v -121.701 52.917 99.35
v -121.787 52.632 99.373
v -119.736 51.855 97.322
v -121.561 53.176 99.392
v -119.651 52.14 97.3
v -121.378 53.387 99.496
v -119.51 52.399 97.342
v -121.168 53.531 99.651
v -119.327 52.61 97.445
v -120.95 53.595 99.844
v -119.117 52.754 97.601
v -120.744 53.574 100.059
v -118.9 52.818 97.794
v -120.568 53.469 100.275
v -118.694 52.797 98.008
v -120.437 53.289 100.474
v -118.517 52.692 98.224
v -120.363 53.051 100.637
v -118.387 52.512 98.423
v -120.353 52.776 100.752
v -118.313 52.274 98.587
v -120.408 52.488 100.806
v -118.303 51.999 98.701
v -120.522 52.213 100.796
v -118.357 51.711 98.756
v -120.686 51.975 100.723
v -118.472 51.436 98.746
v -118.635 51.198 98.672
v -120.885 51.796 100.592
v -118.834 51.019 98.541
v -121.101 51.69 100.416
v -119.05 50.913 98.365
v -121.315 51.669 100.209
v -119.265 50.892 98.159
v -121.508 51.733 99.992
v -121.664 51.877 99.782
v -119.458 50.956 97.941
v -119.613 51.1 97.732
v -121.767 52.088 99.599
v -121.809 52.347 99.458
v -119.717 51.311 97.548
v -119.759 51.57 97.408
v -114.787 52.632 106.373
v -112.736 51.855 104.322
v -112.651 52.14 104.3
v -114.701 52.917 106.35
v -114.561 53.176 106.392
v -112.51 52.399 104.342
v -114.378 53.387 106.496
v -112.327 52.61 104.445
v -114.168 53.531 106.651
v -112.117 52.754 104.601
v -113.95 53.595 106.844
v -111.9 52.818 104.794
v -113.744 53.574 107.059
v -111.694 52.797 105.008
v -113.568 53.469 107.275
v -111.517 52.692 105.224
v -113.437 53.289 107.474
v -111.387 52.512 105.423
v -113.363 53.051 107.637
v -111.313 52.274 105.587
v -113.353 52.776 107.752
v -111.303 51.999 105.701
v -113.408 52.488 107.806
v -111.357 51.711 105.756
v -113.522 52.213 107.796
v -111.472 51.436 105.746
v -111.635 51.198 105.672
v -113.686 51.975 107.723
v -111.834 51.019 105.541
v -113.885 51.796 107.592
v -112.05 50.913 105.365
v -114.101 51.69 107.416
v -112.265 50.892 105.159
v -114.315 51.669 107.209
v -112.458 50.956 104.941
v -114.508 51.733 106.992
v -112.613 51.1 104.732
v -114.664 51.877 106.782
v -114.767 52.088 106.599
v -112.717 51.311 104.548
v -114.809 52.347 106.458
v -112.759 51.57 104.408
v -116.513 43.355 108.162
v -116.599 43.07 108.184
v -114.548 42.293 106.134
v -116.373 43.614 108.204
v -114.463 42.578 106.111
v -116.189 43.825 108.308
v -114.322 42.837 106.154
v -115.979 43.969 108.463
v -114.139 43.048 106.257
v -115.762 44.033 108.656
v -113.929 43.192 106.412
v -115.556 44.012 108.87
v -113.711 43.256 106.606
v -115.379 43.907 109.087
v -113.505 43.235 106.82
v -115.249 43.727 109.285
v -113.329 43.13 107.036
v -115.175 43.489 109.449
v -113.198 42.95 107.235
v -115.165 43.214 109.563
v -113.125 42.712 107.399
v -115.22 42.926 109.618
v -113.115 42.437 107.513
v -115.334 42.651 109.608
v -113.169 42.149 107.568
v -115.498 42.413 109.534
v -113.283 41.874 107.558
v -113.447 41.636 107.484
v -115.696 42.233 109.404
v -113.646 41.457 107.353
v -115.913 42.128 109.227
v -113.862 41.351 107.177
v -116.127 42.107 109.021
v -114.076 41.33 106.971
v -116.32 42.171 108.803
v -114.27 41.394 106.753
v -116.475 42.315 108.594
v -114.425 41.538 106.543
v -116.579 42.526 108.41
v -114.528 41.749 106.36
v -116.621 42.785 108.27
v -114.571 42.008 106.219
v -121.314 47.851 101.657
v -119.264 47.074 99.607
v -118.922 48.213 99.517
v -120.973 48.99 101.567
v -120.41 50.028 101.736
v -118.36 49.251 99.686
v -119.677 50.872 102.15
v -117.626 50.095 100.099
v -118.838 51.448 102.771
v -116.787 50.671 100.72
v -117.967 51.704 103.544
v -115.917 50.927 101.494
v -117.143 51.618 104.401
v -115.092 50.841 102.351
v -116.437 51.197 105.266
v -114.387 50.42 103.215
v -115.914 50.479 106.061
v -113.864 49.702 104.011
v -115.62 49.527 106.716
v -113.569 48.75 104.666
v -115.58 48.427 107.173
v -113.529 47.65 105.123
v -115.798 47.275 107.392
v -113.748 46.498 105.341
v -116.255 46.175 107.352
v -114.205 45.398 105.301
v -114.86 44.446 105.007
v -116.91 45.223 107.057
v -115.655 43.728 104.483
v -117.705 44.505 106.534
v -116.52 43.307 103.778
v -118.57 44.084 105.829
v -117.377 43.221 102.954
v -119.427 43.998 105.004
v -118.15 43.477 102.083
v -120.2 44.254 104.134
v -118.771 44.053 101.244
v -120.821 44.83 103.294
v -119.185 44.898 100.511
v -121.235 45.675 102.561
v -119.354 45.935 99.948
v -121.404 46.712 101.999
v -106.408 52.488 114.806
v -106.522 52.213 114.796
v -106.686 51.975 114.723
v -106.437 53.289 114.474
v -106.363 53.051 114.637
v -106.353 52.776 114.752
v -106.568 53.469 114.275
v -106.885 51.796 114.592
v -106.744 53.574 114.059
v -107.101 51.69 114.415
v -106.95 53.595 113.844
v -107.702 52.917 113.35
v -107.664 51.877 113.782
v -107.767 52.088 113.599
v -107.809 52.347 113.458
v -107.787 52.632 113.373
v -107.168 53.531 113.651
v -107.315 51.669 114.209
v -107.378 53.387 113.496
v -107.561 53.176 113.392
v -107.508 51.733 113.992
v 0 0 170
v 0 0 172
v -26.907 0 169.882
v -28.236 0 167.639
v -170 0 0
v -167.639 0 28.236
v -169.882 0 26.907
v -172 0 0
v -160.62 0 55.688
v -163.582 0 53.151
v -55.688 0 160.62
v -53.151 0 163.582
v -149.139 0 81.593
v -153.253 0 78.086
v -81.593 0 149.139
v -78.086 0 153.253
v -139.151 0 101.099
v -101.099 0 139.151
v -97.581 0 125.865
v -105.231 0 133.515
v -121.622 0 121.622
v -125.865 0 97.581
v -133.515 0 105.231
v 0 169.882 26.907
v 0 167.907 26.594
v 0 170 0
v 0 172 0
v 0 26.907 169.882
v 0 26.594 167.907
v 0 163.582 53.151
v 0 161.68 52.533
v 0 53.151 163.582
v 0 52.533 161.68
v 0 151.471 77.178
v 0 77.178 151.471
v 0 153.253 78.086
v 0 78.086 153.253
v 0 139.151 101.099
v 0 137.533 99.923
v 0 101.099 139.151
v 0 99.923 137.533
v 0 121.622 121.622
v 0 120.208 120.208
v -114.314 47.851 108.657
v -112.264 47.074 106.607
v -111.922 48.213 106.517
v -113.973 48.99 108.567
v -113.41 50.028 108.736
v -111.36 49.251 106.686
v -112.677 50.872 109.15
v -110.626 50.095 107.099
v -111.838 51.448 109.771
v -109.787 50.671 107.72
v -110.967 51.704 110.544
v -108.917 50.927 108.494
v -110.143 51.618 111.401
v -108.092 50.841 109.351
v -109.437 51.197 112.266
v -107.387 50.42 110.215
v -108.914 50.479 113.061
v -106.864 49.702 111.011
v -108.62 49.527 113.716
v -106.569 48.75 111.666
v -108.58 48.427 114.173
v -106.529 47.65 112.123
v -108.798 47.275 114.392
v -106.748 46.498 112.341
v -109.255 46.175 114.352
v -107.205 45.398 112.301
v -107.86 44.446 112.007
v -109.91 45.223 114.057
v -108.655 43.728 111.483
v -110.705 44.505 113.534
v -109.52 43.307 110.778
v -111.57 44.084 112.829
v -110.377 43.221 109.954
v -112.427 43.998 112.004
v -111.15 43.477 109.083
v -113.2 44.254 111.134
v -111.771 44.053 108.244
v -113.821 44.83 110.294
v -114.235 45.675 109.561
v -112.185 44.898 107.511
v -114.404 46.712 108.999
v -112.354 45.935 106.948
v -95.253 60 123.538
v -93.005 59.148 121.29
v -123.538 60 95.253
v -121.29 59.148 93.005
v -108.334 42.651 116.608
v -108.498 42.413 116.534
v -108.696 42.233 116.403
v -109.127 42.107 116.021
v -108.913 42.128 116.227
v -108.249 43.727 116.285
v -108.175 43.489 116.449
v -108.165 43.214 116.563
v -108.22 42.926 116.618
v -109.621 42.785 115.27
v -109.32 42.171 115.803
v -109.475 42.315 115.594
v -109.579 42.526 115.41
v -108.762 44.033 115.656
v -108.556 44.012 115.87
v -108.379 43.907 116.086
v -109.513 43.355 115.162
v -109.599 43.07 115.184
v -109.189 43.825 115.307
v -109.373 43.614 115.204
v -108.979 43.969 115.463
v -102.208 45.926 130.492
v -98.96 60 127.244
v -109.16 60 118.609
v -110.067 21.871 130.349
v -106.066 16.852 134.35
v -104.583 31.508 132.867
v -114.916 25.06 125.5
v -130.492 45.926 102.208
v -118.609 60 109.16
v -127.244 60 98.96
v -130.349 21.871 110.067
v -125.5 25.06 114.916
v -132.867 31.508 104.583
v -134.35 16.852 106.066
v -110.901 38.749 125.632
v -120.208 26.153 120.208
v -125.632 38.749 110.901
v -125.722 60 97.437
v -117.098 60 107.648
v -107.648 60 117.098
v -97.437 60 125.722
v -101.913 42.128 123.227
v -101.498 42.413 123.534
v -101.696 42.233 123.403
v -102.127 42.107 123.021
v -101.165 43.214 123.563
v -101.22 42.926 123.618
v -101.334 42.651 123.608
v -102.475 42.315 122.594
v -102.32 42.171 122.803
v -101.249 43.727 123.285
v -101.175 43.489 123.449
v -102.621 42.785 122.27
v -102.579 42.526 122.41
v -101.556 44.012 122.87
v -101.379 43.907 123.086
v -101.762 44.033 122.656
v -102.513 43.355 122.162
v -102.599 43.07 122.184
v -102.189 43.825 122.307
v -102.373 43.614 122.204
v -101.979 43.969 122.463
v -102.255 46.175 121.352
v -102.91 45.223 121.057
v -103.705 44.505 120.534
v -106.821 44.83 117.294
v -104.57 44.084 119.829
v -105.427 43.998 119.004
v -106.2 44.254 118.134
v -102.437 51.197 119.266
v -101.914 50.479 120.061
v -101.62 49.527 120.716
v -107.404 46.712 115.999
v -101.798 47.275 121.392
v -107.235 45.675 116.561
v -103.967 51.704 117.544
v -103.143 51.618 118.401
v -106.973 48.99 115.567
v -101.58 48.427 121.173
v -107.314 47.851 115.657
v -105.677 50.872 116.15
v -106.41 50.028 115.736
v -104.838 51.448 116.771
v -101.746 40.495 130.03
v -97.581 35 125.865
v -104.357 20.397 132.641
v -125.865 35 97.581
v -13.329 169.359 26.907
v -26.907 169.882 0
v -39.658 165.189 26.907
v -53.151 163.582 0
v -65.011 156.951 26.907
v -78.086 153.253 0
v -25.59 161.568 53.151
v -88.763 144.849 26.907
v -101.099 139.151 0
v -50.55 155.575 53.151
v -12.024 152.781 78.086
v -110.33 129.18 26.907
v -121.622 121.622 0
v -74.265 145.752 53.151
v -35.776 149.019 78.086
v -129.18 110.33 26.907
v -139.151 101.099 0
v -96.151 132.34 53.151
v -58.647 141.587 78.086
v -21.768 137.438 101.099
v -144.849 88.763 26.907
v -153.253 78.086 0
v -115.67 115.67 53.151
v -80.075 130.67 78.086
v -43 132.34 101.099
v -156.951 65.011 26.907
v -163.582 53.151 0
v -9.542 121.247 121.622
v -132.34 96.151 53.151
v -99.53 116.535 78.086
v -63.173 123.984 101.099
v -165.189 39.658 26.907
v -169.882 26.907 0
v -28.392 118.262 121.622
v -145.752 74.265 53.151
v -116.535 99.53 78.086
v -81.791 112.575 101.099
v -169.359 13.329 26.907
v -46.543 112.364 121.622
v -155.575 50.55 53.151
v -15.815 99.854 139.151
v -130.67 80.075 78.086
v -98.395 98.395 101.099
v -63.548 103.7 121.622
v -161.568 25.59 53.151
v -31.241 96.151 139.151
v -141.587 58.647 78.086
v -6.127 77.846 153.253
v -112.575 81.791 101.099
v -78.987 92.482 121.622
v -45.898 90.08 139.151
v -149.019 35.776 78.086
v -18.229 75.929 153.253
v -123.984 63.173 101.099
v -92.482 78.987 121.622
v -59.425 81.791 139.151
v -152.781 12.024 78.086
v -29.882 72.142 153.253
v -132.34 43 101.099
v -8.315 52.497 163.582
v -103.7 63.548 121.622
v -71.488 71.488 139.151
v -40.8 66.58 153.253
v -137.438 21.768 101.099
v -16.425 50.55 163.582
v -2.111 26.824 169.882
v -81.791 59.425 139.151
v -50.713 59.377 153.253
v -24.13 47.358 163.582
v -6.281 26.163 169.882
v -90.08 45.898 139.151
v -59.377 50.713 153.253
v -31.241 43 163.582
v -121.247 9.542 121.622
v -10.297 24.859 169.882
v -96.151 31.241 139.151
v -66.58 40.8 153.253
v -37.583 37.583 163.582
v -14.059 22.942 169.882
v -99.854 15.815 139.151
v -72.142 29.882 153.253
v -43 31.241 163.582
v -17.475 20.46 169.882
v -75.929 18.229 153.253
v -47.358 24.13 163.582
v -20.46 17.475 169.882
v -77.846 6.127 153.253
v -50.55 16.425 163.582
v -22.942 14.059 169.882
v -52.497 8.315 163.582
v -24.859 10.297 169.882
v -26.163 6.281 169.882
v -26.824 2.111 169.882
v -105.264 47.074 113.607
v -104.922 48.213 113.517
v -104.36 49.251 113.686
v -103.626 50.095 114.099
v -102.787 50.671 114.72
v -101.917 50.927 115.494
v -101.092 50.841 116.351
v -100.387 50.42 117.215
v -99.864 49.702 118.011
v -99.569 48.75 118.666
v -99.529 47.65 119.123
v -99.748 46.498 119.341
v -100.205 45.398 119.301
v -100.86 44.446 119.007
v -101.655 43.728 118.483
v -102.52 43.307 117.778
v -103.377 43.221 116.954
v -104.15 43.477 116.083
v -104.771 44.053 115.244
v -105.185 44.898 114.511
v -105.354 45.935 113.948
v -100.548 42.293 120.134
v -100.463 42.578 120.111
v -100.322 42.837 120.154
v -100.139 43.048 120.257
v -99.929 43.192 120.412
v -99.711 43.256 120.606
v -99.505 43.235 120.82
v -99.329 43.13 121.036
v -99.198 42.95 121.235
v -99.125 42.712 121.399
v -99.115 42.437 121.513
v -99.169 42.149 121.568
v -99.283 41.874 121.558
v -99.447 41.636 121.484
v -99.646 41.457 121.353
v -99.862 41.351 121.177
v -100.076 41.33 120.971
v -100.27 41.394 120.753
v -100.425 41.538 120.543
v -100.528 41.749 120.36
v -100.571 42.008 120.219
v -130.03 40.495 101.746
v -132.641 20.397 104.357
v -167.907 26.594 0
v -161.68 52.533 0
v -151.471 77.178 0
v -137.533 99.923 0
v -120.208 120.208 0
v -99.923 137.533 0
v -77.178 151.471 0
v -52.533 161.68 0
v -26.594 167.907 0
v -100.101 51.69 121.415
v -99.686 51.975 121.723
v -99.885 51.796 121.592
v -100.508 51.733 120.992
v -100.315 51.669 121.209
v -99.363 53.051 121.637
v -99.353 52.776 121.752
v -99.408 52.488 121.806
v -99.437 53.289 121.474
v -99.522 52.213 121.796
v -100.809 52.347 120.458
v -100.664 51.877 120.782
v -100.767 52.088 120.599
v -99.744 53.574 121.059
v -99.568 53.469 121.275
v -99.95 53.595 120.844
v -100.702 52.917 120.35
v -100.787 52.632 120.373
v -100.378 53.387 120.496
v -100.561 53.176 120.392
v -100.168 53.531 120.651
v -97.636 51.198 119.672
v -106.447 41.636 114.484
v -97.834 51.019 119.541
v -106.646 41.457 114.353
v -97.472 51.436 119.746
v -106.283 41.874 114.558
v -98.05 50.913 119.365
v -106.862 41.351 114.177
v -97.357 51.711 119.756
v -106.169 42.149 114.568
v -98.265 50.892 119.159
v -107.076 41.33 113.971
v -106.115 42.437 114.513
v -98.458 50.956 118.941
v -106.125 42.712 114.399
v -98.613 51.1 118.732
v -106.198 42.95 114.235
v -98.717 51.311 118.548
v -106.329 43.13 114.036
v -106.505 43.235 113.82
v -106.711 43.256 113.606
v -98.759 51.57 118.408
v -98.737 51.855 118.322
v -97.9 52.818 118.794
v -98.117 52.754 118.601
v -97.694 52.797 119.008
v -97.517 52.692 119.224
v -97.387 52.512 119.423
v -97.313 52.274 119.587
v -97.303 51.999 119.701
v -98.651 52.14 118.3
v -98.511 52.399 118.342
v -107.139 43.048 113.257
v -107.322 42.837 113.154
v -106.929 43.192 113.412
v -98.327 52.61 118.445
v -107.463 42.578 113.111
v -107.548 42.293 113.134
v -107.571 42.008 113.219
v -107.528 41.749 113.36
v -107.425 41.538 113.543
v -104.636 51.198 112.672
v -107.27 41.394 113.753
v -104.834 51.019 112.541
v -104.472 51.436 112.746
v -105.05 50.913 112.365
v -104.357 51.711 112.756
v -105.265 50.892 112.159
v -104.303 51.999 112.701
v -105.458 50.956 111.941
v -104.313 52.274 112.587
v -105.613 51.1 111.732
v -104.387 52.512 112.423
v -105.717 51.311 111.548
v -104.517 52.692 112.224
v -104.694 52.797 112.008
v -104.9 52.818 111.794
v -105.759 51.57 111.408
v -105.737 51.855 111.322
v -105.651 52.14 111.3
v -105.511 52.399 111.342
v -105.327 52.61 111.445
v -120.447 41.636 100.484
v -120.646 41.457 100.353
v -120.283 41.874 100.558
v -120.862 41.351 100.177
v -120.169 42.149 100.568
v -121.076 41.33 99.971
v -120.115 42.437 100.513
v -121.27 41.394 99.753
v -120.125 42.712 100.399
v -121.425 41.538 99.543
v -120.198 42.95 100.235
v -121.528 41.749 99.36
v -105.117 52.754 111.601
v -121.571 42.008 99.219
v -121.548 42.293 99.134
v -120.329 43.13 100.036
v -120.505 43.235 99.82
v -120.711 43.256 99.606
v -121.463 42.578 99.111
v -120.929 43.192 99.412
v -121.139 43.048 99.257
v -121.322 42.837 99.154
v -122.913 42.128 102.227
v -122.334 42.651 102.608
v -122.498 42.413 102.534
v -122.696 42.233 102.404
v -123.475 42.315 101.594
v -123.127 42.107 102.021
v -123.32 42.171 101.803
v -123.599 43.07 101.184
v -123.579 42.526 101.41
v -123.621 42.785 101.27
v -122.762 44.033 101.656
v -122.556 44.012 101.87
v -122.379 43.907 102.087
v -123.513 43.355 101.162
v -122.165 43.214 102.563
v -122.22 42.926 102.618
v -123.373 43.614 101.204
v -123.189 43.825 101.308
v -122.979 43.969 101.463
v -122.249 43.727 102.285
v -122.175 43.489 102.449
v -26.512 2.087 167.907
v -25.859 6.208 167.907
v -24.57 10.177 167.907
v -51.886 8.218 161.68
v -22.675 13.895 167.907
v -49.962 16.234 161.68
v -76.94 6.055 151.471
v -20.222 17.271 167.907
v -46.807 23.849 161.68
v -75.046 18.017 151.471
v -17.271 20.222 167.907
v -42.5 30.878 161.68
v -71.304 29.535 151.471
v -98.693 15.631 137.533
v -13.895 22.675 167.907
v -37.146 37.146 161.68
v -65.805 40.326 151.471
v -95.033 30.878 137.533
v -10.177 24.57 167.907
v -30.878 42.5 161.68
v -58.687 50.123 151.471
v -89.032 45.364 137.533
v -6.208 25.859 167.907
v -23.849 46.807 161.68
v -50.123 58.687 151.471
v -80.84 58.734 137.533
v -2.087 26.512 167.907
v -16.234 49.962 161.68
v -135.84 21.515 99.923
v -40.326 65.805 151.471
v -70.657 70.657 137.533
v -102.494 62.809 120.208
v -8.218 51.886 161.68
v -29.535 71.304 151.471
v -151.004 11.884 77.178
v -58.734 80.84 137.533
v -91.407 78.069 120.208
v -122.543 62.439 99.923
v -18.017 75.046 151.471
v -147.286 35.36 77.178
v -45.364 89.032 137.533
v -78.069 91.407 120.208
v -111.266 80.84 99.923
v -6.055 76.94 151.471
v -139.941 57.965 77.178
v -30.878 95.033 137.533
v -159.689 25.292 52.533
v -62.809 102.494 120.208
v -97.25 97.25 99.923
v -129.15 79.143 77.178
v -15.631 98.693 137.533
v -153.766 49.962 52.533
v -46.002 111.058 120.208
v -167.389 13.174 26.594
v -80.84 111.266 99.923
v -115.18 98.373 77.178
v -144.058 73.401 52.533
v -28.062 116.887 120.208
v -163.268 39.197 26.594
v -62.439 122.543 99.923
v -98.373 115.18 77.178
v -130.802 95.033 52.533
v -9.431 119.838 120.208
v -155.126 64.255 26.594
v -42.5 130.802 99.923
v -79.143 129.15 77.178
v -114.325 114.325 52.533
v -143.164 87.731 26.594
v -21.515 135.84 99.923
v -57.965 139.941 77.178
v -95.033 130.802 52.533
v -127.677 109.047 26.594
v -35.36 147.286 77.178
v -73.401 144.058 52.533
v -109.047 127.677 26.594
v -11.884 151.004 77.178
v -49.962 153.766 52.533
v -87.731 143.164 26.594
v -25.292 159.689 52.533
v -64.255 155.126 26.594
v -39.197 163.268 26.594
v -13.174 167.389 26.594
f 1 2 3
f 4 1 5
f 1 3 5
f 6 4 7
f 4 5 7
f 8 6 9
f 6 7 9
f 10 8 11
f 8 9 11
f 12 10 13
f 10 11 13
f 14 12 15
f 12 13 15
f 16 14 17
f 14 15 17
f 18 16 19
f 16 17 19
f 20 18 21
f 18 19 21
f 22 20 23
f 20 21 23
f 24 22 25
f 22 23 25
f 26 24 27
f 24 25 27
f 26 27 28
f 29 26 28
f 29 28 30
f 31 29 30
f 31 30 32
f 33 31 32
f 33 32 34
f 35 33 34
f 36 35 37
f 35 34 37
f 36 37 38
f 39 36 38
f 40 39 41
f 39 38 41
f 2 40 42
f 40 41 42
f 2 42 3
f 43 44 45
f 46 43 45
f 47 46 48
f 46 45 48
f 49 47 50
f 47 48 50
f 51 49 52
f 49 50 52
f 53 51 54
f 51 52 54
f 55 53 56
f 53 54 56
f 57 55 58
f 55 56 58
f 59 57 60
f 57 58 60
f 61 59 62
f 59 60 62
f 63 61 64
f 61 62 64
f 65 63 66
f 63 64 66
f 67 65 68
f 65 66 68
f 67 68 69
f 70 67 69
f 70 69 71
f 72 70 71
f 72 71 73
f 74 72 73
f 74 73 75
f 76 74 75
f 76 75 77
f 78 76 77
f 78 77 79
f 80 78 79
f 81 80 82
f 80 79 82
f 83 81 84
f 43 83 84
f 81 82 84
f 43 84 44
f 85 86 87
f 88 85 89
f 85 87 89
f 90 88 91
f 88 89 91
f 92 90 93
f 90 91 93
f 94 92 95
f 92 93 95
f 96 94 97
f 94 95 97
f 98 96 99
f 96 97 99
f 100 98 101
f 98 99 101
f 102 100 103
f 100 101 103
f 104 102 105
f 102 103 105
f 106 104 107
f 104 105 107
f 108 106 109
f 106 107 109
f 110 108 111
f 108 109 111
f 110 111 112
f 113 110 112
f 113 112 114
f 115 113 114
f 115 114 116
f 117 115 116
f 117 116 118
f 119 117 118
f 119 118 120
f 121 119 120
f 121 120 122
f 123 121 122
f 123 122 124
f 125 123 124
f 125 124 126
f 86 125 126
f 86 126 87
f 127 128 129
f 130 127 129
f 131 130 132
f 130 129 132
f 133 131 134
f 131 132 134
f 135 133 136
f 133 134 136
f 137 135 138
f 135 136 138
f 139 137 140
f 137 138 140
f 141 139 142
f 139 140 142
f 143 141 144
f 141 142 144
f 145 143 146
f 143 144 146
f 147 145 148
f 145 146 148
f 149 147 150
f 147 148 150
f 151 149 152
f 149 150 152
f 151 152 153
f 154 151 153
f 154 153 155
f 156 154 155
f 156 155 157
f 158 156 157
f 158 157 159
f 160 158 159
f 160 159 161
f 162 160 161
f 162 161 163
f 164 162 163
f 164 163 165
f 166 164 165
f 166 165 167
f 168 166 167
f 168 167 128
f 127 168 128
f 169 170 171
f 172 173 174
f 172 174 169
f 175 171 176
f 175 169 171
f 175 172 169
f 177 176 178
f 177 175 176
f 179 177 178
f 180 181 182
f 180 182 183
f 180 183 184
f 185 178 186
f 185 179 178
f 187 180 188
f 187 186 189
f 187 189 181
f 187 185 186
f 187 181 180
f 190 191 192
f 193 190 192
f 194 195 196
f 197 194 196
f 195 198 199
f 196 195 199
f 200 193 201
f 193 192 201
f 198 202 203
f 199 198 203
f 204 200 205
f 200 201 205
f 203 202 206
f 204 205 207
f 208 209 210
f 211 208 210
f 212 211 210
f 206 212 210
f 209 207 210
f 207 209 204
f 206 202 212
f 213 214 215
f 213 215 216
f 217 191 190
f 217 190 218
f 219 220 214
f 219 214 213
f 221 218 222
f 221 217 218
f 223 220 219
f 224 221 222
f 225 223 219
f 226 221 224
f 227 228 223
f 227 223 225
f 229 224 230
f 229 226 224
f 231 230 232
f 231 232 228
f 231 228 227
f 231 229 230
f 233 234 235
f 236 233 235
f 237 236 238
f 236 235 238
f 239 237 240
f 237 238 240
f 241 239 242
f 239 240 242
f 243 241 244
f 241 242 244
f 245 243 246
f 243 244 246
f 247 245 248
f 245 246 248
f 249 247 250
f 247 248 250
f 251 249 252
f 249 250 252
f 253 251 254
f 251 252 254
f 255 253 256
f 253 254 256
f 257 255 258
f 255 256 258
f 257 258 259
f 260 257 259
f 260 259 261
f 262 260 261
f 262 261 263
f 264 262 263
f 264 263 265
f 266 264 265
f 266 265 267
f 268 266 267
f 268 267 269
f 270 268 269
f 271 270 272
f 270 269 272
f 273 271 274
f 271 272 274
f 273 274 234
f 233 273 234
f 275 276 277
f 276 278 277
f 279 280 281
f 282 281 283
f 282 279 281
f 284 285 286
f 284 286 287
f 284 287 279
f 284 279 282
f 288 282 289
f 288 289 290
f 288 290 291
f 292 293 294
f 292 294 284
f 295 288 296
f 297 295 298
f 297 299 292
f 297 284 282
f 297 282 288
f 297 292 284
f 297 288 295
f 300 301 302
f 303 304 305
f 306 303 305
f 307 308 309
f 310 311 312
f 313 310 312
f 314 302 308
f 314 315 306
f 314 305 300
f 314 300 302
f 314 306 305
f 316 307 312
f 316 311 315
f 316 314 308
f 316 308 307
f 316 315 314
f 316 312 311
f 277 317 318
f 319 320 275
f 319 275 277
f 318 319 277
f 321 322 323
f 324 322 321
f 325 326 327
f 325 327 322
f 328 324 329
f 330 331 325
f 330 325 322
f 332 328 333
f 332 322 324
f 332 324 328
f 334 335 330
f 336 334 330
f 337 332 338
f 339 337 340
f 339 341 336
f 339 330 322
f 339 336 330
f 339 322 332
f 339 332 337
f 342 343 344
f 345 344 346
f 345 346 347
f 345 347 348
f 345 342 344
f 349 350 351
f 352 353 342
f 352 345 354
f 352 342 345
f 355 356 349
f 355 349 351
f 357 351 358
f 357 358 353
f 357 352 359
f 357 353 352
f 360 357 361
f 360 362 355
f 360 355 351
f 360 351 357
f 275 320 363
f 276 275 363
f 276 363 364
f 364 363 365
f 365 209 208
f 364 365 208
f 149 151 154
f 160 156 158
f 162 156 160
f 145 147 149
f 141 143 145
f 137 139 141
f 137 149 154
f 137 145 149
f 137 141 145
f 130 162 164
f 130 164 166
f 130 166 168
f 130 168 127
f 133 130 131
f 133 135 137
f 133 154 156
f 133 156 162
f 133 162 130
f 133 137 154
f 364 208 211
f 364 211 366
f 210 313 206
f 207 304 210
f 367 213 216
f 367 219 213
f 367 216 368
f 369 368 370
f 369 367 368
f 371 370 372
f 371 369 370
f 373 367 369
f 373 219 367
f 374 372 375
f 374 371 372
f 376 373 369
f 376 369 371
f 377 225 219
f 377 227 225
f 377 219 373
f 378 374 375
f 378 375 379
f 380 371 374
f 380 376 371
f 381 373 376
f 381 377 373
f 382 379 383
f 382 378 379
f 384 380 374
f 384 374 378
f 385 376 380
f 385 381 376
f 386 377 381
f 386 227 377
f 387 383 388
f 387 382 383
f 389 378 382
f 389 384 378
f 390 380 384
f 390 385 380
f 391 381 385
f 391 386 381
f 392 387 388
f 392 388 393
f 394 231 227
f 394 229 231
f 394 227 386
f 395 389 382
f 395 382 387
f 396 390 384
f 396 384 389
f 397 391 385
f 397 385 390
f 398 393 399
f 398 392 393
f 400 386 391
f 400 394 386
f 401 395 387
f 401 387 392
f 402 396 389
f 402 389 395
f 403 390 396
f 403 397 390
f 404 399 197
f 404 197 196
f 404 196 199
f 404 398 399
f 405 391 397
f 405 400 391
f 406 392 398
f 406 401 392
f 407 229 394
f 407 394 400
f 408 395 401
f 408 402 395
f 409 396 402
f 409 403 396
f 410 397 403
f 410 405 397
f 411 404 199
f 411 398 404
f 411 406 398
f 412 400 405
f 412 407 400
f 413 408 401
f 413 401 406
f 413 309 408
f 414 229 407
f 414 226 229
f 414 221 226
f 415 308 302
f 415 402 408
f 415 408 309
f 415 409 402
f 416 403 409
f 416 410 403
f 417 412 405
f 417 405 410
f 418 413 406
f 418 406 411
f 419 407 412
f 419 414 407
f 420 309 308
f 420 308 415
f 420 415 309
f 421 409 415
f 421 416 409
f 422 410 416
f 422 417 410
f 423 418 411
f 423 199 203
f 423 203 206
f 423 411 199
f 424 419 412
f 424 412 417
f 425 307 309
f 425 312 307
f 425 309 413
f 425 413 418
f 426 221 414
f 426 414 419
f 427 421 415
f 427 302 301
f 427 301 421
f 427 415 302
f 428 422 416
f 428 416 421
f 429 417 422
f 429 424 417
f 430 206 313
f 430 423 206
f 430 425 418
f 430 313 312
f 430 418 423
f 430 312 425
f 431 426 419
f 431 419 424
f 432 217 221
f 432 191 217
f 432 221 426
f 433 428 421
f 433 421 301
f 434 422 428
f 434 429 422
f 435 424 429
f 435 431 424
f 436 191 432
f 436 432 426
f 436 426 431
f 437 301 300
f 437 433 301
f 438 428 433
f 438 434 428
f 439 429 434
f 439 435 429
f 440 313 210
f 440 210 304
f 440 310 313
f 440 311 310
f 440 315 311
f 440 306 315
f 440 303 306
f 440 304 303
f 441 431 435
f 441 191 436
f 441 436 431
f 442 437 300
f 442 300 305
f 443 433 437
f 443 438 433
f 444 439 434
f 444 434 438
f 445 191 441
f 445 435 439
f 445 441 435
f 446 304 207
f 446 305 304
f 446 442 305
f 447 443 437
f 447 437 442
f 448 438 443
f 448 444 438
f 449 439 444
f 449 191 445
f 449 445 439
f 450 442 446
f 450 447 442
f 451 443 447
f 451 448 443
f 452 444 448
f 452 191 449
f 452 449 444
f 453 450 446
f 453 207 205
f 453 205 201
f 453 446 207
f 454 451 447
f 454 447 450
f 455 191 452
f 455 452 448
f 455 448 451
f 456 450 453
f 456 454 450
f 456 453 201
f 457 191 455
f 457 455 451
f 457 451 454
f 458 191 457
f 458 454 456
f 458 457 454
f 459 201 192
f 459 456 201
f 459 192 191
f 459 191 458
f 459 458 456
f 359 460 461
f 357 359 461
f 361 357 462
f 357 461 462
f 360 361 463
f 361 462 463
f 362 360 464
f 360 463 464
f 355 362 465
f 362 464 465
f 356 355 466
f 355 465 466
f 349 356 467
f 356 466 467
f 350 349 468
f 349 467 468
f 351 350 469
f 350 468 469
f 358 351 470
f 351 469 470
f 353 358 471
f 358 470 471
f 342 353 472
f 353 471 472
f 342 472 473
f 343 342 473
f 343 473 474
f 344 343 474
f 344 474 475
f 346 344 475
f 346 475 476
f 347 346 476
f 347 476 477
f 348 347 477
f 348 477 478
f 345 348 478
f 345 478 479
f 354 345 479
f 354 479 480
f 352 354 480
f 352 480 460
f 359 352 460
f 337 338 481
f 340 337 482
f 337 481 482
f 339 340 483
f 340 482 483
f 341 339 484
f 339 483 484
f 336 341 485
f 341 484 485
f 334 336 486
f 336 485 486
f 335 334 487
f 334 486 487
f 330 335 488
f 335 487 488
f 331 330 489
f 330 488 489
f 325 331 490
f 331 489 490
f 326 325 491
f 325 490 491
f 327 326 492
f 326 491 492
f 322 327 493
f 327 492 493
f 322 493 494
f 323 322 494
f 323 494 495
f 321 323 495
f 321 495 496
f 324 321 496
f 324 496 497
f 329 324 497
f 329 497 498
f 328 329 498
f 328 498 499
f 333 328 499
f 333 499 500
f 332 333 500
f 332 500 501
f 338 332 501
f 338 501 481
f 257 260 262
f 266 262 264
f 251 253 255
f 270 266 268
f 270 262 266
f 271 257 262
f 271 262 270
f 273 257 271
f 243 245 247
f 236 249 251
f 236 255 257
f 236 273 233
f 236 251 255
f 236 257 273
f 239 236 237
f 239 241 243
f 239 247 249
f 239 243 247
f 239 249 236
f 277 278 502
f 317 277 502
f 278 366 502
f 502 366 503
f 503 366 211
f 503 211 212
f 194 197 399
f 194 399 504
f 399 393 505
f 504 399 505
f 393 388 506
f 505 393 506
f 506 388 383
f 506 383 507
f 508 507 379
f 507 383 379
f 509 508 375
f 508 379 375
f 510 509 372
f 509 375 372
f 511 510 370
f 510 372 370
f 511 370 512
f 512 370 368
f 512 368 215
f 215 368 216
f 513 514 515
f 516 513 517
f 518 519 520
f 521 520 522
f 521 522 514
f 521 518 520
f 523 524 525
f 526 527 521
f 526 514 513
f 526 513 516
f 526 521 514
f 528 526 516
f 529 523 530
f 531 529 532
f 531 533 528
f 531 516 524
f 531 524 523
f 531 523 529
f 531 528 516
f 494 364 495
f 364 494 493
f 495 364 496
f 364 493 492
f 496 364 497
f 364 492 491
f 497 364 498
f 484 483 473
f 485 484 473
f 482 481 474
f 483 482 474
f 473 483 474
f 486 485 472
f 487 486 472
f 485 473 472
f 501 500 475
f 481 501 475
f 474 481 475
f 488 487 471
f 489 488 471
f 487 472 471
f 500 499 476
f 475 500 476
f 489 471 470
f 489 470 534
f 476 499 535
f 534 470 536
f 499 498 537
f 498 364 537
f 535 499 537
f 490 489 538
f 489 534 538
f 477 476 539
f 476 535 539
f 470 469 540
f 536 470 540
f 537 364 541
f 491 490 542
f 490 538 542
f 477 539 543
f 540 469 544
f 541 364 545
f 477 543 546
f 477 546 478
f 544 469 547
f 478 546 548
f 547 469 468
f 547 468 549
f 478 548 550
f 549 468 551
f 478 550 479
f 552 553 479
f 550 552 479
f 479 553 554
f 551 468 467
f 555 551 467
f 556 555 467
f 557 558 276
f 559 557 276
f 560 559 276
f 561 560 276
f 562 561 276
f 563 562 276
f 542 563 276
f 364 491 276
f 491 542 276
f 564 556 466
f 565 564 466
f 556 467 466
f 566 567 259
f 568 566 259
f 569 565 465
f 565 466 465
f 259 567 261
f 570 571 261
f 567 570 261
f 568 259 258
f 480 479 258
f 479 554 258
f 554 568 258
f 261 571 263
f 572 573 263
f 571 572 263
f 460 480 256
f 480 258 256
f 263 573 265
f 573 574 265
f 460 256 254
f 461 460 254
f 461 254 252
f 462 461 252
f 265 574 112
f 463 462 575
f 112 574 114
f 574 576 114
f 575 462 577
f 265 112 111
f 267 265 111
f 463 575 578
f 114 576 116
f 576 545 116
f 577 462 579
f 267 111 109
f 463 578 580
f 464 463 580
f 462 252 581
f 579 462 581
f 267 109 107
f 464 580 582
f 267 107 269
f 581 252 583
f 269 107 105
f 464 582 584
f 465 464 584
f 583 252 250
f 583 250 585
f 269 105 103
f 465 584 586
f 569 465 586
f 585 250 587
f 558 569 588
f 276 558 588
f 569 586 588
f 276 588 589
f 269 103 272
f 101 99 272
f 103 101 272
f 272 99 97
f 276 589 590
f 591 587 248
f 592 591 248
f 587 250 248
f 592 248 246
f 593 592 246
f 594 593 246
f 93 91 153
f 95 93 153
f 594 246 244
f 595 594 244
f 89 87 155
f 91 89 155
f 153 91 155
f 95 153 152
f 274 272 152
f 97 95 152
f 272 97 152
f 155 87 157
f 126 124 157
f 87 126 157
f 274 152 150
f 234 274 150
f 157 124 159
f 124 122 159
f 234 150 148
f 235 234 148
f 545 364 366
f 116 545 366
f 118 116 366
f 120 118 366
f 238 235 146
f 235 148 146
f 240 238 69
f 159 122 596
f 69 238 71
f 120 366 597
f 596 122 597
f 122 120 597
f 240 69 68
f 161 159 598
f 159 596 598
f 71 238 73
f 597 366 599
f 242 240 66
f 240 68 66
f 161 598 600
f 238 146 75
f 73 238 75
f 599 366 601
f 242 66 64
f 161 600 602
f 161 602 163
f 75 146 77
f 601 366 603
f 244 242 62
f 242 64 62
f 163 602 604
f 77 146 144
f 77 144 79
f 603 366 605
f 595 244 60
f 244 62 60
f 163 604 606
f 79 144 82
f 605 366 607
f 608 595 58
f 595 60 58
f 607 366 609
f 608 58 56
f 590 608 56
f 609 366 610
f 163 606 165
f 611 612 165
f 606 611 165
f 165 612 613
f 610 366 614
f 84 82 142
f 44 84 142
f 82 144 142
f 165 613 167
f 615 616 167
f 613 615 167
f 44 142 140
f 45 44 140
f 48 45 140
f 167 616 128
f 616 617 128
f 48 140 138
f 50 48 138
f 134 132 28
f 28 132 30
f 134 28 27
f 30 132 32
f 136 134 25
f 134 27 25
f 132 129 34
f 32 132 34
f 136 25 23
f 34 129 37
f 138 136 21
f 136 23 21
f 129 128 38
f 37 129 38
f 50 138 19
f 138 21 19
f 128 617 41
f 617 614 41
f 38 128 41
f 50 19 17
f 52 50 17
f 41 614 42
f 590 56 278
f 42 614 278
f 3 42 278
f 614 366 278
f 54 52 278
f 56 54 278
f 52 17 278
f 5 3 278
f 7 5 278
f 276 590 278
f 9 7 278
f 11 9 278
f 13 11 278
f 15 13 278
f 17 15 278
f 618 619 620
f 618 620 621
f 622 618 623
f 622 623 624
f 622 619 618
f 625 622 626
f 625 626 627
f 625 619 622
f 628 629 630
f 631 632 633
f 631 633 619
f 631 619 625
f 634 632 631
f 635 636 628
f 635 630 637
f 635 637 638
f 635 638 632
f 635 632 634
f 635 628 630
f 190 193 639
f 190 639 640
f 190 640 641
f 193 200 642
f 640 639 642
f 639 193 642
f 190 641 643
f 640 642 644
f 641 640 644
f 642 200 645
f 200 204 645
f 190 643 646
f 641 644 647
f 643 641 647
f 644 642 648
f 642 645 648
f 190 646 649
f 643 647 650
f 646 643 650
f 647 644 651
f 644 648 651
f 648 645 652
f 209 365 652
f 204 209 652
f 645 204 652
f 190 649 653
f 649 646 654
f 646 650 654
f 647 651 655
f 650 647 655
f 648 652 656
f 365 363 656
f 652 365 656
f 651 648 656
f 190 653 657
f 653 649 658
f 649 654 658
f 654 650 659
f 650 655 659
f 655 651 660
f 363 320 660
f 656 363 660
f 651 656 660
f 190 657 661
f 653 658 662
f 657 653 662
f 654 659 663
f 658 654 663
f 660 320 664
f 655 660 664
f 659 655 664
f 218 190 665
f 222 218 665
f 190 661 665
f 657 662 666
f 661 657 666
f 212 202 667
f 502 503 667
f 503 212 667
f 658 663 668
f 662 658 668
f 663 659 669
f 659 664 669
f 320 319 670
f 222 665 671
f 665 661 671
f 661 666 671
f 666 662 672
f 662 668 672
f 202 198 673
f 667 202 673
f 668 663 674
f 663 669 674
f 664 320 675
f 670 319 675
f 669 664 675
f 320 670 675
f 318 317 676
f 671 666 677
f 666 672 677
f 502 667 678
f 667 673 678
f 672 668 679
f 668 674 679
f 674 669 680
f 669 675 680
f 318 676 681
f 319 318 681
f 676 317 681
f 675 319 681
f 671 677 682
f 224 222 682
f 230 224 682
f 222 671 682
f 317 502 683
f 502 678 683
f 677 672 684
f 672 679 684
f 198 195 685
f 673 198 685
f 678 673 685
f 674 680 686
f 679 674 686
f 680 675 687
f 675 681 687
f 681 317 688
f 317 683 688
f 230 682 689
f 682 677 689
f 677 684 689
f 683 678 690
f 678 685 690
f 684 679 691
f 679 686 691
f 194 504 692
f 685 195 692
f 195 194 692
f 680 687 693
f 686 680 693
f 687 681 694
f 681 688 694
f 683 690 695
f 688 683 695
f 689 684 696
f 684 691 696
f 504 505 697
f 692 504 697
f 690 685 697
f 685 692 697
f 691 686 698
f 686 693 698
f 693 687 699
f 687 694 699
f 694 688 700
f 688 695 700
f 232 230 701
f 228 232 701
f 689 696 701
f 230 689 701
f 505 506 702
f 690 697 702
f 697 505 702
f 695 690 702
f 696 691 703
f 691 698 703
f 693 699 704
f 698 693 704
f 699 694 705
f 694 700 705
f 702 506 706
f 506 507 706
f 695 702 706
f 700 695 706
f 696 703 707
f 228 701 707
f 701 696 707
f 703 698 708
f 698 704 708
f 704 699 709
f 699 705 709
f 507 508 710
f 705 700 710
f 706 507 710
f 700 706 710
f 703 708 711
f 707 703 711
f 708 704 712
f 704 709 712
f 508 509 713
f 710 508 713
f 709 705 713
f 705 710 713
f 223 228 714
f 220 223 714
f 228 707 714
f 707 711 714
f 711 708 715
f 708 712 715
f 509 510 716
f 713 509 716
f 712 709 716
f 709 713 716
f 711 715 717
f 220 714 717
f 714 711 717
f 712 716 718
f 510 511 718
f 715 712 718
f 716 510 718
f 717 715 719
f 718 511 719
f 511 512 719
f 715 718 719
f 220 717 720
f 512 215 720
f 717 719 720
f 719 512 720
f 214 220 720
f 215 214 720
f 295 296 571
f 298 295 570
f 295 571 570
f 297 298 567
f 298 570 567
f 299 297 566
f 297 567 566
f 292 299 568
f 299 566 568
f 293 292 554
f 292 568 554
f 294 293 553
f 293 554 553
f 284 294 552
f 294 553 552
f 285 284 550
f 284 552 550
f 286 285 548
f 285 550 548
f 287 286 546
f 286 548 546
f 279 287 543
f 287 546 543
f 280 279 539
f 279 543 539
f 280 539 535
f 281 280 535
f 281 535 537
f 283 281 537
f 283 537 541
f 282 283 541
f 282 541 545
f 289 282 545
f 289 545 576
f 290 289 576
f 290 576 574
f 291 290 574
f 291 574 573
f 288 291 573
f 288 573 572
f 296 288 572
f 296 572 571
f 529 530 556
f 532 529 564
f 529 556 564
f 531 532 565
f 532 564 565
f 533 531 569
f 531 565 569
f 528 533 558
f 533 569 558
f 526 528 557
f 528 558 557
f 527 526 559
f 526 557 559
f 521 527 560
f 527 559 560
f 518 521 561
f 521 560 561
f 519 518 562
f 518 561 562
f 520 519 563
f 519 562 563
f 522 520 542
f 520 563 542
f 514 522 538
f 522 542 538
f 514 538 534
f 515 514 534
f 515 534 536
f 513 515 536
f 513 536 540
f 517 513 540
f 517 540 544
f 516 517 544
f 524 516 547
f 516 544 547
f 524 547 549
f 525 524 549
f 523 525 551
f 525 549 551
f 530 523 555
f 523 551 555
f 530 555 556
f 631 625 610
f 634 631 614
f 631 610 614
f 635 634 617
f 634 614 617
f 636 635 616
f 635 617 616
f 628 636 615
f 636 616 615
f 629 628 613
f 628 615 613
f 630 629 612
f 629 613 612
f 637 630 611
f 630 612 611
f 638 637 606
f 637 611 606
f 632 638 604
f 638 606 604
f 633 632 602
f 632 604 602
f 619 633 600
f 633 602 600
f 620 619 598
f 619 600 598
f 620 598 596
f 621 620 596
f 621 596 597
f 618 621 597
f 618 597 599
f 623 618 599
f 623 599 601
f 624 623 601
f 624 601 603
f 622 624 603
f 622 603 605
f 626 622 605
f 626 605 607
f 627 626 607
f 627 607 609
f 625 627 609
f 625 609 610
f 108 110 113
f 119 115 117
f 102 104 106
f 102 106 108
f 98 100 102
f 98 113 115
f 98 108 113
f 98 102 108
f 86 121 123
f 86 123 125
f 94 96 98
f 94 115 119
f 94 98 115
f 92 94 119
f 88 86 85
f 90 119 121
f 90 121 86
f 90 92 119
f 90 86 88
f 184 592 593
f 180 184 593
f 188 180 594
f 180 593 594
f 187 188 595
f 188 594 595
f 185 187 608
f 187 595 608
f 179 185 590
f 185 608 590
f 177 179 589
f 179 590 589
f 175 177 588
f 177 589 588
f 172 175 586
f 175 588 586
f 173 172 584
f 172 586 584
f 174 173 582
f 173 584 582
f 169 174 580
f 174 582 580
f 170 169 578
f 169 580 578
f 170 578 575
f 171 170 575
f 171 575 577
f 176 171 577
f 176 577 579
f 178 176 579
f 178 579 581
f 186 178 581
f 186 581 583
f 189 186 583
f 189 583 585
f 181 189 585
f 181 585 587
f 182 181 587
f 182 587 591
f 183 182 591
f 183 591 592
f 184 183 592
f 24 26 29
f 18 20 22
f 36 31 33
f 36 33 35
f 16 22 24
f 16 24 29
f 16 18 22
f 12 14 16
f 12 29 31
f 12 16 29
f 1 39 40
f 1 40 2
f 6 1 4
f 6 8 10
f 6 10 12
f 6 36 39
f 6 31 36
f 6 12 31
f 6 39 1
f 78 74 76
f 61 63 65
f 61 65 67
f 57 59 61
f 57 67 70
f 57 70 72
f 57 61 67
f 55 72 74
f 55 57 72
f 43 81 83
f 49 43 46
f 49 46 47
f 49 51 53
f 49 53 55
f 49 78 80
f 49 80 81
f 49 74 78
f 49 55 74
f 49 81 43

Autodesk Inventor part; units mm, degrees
ref_plane "YZ Plane" through (0, 0, 0) normal (1, 0, 0) x (0, 1, 0)
ref_plane "XZ Plane" through (0, 0, 0) normal (0, 1, 0) x (-1, 0, 0)
ref_plane "XY Plane" through (0, 0, 0) normal (0, 0, 1) x (1, 0, 0)
sketch "Sketch1" plane through (0, 0, 0) normal (0, 1, 0) x (-1, 0, 0)
  arc A0 (172, 0) -> (0, 172) centre (0, 0) ccw
  line L0 (0, 172) -> (0, 0)
  line L1 (172, 0) -> (0, 0)
revolve "Revolution1" add sketch "Sketch1" angle 90 about axis through (0, 0, 172) along (0, 0, -1)
sketch "Sketch2" plane through (-172, 0, 0) normal (0, -1, 0) x (1, 0, 0)
  arc A0 (172, 170) -> (2, 0) centre (172, 0) ccw
  line L0 (172, 0) -> (172, 172) projected
  line L1 (172, 0) -> (2, 0)
  line L2 (172, 0) -> (172, 170)
revolve "Revolution2" cut sketch "Sketch2" angle 90 about axis through (0, 0, 0) along (0, 0, -1)
sketch "Sketch4" plane through (0, 0, 0) normal (0, -1, 0) x (0.7071068, 0, -0.7071068)
  arc A0 (-120.2082, 120.2082) -> (-120.2082, -120.2082) centre (0, 0) ccw projected
  line L0 (-170, 0) -> (-150, 0)
  line L1 (-150, 0) -> (-150, -20)
  line L2 (-150, 0) -> (-150, 20)
  line L3 (-150, -20) -> (-170, -20)
  line L4 (-170, -20) -> (-170, 20)
  line L5 (-170, 20) -> (-150, 20)
  dimension "d34" = 20
  dimension "d35" = 20
  dimension "d36" = 20
  dimension "d56" = 20
  dimension "d57" = 40
extrude "Extrusion2" add sketch "Sketch4" against normal blind 60
sketch "Sketch6" plane through (0, 0, 0) normal (1, 0, 0) x (0, -0.7071068, -0.7071068)
  line L0 (-120.2082, 120.2082) -> (0, 0) projected
  line L1 (-120.2082, -120.2082) -> (-121.6224, -121.6224) projected
  arc A0 (-121.6224, 121.6224) -> (-121.6224, -121.6224) centre (0, 0) ccw
  line L2 (0, 0) -> (-120.2082, -120.2082) projected
  arc A1 (-134.3503, 134.3503) -> (-134.3503, -134.3503) centre (0, 0) ccw
  line L3 (-121.6224, 121.6224) -> (-134.3503, 134.3503)
  line L4 (-121.6224, -121.6224) -> (-134.3503, -134.3503)
  point P0 (-74.4097, -74.4097)
revolve "Revolution3" cut sketch "Sketch6" angle 90 about axis through (0, 170, 0) along (0, -1, 0)
sketch "Sketch9" plane through (-120.2082, 0, 91.9239) normal (-0.7071068, 0, -0.7071068) x (-0.7071068, 0, 0.7071068)
  line L0 (0, 0) -> (0, 60) projected
  line L1 (0, 0) -> (8, 0)
  line L2 (18.8194, 0) -> (0, 0) projected
  line L3 (8, 0) -> (8, 35)
  line L4 (8, 35) -> (1.5295, 59.1481)
  line L5 (1.5295, 59.1481) -> (4.7087, 60)
  line L6 (0, 60) -> (7.7973, 60) projected
  line L7 (4.7087, 60) -> (0, 60)
  line L8 (0, 60) -> (0, 0)
  point P0 (-150, 0)
  dimension "d58" = 8
  dimension "d59" = 35
  dimension "d60" = 25
  dimension "d61" = 165
extrude "Extrusion5" cut sketch "Sketch9" against normal blind 40
sketch "Sketch10" plane through (-125.865, 35, 97.5807) normal (0.6830127, -0.258819, -0.6830127) x (-0.7071068, 0, -0.7071068)
  line L0 (0, 25) -> (0, 0) projected
  line L1 (0, 25) -> (-40, 25) projected
  line L2 (-40, 0) -> (-40, 25) projected
  line L3 (-40, 25) -> (0, 25) projected
  circle A0 centre (-20, 12.5) radius 4
  circle A1 centre (-15.0503, 7.5503) radius 1
  circle A2 centre (-24.9497, 7.5503) radius 1
  circle A3 centre (-24.9497, 17.4497) radius 1
  circle A4 centre (-15.0503, 17.4497) radius 1
  line L4 (-24.9497, 7.5503) -> (-10.9497, 7.5503) construction
  circle A5 centre (-29.8995, 12.5) radius 4
  circle A6 centre (-34.8492, 7.5503) radius 1
  circle A7 centre (-34.8492, 17.4497) radius 1
  line L5 (-15.0503, 17.4497) -> (-1.0503, 17.4497) construction
  line L6 (-15.0503, 7.5503) -> (-1.0503, 7.5503) construction
  circle A8 centre (-10.1005, 12.5) radius 4
  circle A9 centre (-5.1508, 7.5503) radius 1
  circle A10 centre (-5.1508, 17.4497) radius 1
  dimension "d64" = 8
  dimension "d68" = 2
  dimension "d69" = 2
  dimension "d70" = 2
  dimension "d72" = 2
  dimension "d76" = 8
  dimension "d77" = 2
  dimension "d78" = 2
  dimension "d83" = 8
  dimension "d84" = 2
  dimension "d85" = 2
extrude "Extrusion6" cut sketch "Sketch10" against normal blind 3
properties part number "shell" material "Glass"
